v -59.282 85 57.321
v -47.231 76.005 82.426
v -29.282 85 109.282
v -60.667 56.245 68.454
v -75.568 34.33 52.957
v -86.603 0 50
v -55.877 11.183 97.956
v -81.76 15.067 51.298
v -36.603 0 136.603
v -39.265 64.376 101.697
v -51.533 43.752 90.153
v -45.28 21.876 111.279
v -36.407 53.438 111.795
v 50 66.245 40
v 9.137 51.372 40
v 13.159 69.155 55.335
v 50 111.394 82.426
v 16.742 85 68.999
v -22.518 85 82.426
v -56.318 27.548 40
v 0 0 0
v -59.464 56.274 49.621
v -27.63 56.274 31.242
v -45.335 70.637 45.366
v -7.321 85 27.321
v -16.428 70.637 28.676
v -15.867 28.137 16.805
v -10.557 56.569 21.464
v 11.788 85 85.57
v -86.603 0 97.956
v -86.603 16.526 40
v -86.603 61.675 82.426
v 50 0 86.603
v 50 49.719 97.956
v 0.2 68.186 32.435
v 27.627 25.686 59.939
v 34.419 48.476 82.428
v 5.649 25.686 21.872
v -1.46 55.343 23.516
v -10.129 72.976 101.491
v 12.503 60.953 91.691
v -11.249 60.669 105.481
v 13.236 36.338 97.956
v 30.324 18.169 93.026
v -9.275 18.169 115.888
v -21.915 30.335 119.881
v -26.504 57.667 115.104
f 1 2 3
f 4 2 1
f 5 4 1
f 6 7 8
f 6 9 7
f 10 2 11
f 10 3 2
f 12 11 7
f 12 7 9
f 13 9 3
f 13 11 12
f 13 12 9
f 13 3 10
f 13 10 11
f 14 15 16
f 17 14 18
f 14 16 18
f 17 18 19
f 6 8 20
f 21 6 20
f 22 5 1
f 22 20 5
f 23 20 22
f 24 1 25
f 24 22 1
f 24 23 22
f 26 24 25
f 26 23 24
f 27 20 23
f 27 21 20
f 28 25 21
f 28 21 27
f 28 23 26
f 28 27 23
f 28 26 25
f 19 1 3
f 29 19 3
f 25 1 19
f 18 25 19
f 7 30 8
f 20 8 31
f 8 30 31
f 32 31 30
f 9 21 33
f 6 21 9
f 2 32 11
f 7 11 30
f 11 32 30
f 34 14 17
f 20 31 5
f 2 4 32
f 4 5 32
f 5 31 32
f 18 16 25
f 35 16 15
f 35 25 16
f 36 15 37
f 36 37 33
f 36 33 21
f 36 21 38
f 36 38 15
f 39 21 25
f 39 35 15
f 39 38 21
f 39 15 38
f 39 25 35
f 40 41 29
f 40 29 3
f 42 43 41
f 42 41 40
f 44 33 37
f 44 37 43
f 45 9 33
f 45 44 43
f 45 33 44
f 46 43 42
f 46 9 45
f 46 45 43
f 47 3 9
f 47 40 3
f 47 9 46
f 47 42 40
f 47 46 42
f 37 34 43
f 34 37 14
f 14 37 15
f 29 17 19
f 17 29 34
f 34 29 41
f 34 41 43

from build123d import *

# Parameters (mm, degrees)
TRIANGULAR_PRISM_DEPTH = 170
SKETCH5_W              = 20.831302692
SKETCH5_H              = 63.48520277
SKETCH5_W_2            = 25.650693989
SKETCH5_H_2            = 114.24619151
CUT_EXTRUDE1_DEPTH     = 100


with BuildPart() as part:
    # Sketch2 → Pyramid section 0
    with BuildSketch(Plane(origin=(0, 85, 0), x_dir=(-1, 0, 0), z_dir=(0, 1, 0))):
        Polygon((59.282032303, 57.320508076), (7.320508076, 27.320508076), (-22.679491924, 79.282032303), (29.282032303, 109.282032303), align=None)
    # Sketch1 → Pyramid section 1
    with BuildSketch(Plane(origin=(0, 0, 0), x_dir=(1, 0, 0), z_dir=(0, 1, 0))):
        Polygon((0, 0), (-86.602540378, -50), (-36.602540378, -136.602540378), (50, -86.602540378), align=None)
    loft()

    # Sketch4 → Triangular Prism (add)
    with BuildSketch(Plane(origin=(-76.471967598, -27.833519961, 0), x_dir=(0, 0, -1), z_dir=(0.939692621, 0.342020143, 0))):
        Polygon((-97.955549577, 29.619813273), (-40, 45.148955979), (-82.426406871, 87.57536285), align=None)
    extrude(amount=TRIANGULAR_PRISM_DEPTH)

    # Sketch5 → Cut-Extrude1 (cut)
    with BuildSketch(Plane.XY):
        with Locations((-97.018191724, 31.742601385)):
            Rectangle(SKETCH5_W, SKETCH5_H)
        with Locations((62.825346995, 57.123095755)):
            Rectangle(SKETCH5_W_2, SKETCH5_H_2)
    extrude(amount=CUT_EXTRUDE1_DEPTH, mode=Mode.SUBTRACT)


solid = part.part
